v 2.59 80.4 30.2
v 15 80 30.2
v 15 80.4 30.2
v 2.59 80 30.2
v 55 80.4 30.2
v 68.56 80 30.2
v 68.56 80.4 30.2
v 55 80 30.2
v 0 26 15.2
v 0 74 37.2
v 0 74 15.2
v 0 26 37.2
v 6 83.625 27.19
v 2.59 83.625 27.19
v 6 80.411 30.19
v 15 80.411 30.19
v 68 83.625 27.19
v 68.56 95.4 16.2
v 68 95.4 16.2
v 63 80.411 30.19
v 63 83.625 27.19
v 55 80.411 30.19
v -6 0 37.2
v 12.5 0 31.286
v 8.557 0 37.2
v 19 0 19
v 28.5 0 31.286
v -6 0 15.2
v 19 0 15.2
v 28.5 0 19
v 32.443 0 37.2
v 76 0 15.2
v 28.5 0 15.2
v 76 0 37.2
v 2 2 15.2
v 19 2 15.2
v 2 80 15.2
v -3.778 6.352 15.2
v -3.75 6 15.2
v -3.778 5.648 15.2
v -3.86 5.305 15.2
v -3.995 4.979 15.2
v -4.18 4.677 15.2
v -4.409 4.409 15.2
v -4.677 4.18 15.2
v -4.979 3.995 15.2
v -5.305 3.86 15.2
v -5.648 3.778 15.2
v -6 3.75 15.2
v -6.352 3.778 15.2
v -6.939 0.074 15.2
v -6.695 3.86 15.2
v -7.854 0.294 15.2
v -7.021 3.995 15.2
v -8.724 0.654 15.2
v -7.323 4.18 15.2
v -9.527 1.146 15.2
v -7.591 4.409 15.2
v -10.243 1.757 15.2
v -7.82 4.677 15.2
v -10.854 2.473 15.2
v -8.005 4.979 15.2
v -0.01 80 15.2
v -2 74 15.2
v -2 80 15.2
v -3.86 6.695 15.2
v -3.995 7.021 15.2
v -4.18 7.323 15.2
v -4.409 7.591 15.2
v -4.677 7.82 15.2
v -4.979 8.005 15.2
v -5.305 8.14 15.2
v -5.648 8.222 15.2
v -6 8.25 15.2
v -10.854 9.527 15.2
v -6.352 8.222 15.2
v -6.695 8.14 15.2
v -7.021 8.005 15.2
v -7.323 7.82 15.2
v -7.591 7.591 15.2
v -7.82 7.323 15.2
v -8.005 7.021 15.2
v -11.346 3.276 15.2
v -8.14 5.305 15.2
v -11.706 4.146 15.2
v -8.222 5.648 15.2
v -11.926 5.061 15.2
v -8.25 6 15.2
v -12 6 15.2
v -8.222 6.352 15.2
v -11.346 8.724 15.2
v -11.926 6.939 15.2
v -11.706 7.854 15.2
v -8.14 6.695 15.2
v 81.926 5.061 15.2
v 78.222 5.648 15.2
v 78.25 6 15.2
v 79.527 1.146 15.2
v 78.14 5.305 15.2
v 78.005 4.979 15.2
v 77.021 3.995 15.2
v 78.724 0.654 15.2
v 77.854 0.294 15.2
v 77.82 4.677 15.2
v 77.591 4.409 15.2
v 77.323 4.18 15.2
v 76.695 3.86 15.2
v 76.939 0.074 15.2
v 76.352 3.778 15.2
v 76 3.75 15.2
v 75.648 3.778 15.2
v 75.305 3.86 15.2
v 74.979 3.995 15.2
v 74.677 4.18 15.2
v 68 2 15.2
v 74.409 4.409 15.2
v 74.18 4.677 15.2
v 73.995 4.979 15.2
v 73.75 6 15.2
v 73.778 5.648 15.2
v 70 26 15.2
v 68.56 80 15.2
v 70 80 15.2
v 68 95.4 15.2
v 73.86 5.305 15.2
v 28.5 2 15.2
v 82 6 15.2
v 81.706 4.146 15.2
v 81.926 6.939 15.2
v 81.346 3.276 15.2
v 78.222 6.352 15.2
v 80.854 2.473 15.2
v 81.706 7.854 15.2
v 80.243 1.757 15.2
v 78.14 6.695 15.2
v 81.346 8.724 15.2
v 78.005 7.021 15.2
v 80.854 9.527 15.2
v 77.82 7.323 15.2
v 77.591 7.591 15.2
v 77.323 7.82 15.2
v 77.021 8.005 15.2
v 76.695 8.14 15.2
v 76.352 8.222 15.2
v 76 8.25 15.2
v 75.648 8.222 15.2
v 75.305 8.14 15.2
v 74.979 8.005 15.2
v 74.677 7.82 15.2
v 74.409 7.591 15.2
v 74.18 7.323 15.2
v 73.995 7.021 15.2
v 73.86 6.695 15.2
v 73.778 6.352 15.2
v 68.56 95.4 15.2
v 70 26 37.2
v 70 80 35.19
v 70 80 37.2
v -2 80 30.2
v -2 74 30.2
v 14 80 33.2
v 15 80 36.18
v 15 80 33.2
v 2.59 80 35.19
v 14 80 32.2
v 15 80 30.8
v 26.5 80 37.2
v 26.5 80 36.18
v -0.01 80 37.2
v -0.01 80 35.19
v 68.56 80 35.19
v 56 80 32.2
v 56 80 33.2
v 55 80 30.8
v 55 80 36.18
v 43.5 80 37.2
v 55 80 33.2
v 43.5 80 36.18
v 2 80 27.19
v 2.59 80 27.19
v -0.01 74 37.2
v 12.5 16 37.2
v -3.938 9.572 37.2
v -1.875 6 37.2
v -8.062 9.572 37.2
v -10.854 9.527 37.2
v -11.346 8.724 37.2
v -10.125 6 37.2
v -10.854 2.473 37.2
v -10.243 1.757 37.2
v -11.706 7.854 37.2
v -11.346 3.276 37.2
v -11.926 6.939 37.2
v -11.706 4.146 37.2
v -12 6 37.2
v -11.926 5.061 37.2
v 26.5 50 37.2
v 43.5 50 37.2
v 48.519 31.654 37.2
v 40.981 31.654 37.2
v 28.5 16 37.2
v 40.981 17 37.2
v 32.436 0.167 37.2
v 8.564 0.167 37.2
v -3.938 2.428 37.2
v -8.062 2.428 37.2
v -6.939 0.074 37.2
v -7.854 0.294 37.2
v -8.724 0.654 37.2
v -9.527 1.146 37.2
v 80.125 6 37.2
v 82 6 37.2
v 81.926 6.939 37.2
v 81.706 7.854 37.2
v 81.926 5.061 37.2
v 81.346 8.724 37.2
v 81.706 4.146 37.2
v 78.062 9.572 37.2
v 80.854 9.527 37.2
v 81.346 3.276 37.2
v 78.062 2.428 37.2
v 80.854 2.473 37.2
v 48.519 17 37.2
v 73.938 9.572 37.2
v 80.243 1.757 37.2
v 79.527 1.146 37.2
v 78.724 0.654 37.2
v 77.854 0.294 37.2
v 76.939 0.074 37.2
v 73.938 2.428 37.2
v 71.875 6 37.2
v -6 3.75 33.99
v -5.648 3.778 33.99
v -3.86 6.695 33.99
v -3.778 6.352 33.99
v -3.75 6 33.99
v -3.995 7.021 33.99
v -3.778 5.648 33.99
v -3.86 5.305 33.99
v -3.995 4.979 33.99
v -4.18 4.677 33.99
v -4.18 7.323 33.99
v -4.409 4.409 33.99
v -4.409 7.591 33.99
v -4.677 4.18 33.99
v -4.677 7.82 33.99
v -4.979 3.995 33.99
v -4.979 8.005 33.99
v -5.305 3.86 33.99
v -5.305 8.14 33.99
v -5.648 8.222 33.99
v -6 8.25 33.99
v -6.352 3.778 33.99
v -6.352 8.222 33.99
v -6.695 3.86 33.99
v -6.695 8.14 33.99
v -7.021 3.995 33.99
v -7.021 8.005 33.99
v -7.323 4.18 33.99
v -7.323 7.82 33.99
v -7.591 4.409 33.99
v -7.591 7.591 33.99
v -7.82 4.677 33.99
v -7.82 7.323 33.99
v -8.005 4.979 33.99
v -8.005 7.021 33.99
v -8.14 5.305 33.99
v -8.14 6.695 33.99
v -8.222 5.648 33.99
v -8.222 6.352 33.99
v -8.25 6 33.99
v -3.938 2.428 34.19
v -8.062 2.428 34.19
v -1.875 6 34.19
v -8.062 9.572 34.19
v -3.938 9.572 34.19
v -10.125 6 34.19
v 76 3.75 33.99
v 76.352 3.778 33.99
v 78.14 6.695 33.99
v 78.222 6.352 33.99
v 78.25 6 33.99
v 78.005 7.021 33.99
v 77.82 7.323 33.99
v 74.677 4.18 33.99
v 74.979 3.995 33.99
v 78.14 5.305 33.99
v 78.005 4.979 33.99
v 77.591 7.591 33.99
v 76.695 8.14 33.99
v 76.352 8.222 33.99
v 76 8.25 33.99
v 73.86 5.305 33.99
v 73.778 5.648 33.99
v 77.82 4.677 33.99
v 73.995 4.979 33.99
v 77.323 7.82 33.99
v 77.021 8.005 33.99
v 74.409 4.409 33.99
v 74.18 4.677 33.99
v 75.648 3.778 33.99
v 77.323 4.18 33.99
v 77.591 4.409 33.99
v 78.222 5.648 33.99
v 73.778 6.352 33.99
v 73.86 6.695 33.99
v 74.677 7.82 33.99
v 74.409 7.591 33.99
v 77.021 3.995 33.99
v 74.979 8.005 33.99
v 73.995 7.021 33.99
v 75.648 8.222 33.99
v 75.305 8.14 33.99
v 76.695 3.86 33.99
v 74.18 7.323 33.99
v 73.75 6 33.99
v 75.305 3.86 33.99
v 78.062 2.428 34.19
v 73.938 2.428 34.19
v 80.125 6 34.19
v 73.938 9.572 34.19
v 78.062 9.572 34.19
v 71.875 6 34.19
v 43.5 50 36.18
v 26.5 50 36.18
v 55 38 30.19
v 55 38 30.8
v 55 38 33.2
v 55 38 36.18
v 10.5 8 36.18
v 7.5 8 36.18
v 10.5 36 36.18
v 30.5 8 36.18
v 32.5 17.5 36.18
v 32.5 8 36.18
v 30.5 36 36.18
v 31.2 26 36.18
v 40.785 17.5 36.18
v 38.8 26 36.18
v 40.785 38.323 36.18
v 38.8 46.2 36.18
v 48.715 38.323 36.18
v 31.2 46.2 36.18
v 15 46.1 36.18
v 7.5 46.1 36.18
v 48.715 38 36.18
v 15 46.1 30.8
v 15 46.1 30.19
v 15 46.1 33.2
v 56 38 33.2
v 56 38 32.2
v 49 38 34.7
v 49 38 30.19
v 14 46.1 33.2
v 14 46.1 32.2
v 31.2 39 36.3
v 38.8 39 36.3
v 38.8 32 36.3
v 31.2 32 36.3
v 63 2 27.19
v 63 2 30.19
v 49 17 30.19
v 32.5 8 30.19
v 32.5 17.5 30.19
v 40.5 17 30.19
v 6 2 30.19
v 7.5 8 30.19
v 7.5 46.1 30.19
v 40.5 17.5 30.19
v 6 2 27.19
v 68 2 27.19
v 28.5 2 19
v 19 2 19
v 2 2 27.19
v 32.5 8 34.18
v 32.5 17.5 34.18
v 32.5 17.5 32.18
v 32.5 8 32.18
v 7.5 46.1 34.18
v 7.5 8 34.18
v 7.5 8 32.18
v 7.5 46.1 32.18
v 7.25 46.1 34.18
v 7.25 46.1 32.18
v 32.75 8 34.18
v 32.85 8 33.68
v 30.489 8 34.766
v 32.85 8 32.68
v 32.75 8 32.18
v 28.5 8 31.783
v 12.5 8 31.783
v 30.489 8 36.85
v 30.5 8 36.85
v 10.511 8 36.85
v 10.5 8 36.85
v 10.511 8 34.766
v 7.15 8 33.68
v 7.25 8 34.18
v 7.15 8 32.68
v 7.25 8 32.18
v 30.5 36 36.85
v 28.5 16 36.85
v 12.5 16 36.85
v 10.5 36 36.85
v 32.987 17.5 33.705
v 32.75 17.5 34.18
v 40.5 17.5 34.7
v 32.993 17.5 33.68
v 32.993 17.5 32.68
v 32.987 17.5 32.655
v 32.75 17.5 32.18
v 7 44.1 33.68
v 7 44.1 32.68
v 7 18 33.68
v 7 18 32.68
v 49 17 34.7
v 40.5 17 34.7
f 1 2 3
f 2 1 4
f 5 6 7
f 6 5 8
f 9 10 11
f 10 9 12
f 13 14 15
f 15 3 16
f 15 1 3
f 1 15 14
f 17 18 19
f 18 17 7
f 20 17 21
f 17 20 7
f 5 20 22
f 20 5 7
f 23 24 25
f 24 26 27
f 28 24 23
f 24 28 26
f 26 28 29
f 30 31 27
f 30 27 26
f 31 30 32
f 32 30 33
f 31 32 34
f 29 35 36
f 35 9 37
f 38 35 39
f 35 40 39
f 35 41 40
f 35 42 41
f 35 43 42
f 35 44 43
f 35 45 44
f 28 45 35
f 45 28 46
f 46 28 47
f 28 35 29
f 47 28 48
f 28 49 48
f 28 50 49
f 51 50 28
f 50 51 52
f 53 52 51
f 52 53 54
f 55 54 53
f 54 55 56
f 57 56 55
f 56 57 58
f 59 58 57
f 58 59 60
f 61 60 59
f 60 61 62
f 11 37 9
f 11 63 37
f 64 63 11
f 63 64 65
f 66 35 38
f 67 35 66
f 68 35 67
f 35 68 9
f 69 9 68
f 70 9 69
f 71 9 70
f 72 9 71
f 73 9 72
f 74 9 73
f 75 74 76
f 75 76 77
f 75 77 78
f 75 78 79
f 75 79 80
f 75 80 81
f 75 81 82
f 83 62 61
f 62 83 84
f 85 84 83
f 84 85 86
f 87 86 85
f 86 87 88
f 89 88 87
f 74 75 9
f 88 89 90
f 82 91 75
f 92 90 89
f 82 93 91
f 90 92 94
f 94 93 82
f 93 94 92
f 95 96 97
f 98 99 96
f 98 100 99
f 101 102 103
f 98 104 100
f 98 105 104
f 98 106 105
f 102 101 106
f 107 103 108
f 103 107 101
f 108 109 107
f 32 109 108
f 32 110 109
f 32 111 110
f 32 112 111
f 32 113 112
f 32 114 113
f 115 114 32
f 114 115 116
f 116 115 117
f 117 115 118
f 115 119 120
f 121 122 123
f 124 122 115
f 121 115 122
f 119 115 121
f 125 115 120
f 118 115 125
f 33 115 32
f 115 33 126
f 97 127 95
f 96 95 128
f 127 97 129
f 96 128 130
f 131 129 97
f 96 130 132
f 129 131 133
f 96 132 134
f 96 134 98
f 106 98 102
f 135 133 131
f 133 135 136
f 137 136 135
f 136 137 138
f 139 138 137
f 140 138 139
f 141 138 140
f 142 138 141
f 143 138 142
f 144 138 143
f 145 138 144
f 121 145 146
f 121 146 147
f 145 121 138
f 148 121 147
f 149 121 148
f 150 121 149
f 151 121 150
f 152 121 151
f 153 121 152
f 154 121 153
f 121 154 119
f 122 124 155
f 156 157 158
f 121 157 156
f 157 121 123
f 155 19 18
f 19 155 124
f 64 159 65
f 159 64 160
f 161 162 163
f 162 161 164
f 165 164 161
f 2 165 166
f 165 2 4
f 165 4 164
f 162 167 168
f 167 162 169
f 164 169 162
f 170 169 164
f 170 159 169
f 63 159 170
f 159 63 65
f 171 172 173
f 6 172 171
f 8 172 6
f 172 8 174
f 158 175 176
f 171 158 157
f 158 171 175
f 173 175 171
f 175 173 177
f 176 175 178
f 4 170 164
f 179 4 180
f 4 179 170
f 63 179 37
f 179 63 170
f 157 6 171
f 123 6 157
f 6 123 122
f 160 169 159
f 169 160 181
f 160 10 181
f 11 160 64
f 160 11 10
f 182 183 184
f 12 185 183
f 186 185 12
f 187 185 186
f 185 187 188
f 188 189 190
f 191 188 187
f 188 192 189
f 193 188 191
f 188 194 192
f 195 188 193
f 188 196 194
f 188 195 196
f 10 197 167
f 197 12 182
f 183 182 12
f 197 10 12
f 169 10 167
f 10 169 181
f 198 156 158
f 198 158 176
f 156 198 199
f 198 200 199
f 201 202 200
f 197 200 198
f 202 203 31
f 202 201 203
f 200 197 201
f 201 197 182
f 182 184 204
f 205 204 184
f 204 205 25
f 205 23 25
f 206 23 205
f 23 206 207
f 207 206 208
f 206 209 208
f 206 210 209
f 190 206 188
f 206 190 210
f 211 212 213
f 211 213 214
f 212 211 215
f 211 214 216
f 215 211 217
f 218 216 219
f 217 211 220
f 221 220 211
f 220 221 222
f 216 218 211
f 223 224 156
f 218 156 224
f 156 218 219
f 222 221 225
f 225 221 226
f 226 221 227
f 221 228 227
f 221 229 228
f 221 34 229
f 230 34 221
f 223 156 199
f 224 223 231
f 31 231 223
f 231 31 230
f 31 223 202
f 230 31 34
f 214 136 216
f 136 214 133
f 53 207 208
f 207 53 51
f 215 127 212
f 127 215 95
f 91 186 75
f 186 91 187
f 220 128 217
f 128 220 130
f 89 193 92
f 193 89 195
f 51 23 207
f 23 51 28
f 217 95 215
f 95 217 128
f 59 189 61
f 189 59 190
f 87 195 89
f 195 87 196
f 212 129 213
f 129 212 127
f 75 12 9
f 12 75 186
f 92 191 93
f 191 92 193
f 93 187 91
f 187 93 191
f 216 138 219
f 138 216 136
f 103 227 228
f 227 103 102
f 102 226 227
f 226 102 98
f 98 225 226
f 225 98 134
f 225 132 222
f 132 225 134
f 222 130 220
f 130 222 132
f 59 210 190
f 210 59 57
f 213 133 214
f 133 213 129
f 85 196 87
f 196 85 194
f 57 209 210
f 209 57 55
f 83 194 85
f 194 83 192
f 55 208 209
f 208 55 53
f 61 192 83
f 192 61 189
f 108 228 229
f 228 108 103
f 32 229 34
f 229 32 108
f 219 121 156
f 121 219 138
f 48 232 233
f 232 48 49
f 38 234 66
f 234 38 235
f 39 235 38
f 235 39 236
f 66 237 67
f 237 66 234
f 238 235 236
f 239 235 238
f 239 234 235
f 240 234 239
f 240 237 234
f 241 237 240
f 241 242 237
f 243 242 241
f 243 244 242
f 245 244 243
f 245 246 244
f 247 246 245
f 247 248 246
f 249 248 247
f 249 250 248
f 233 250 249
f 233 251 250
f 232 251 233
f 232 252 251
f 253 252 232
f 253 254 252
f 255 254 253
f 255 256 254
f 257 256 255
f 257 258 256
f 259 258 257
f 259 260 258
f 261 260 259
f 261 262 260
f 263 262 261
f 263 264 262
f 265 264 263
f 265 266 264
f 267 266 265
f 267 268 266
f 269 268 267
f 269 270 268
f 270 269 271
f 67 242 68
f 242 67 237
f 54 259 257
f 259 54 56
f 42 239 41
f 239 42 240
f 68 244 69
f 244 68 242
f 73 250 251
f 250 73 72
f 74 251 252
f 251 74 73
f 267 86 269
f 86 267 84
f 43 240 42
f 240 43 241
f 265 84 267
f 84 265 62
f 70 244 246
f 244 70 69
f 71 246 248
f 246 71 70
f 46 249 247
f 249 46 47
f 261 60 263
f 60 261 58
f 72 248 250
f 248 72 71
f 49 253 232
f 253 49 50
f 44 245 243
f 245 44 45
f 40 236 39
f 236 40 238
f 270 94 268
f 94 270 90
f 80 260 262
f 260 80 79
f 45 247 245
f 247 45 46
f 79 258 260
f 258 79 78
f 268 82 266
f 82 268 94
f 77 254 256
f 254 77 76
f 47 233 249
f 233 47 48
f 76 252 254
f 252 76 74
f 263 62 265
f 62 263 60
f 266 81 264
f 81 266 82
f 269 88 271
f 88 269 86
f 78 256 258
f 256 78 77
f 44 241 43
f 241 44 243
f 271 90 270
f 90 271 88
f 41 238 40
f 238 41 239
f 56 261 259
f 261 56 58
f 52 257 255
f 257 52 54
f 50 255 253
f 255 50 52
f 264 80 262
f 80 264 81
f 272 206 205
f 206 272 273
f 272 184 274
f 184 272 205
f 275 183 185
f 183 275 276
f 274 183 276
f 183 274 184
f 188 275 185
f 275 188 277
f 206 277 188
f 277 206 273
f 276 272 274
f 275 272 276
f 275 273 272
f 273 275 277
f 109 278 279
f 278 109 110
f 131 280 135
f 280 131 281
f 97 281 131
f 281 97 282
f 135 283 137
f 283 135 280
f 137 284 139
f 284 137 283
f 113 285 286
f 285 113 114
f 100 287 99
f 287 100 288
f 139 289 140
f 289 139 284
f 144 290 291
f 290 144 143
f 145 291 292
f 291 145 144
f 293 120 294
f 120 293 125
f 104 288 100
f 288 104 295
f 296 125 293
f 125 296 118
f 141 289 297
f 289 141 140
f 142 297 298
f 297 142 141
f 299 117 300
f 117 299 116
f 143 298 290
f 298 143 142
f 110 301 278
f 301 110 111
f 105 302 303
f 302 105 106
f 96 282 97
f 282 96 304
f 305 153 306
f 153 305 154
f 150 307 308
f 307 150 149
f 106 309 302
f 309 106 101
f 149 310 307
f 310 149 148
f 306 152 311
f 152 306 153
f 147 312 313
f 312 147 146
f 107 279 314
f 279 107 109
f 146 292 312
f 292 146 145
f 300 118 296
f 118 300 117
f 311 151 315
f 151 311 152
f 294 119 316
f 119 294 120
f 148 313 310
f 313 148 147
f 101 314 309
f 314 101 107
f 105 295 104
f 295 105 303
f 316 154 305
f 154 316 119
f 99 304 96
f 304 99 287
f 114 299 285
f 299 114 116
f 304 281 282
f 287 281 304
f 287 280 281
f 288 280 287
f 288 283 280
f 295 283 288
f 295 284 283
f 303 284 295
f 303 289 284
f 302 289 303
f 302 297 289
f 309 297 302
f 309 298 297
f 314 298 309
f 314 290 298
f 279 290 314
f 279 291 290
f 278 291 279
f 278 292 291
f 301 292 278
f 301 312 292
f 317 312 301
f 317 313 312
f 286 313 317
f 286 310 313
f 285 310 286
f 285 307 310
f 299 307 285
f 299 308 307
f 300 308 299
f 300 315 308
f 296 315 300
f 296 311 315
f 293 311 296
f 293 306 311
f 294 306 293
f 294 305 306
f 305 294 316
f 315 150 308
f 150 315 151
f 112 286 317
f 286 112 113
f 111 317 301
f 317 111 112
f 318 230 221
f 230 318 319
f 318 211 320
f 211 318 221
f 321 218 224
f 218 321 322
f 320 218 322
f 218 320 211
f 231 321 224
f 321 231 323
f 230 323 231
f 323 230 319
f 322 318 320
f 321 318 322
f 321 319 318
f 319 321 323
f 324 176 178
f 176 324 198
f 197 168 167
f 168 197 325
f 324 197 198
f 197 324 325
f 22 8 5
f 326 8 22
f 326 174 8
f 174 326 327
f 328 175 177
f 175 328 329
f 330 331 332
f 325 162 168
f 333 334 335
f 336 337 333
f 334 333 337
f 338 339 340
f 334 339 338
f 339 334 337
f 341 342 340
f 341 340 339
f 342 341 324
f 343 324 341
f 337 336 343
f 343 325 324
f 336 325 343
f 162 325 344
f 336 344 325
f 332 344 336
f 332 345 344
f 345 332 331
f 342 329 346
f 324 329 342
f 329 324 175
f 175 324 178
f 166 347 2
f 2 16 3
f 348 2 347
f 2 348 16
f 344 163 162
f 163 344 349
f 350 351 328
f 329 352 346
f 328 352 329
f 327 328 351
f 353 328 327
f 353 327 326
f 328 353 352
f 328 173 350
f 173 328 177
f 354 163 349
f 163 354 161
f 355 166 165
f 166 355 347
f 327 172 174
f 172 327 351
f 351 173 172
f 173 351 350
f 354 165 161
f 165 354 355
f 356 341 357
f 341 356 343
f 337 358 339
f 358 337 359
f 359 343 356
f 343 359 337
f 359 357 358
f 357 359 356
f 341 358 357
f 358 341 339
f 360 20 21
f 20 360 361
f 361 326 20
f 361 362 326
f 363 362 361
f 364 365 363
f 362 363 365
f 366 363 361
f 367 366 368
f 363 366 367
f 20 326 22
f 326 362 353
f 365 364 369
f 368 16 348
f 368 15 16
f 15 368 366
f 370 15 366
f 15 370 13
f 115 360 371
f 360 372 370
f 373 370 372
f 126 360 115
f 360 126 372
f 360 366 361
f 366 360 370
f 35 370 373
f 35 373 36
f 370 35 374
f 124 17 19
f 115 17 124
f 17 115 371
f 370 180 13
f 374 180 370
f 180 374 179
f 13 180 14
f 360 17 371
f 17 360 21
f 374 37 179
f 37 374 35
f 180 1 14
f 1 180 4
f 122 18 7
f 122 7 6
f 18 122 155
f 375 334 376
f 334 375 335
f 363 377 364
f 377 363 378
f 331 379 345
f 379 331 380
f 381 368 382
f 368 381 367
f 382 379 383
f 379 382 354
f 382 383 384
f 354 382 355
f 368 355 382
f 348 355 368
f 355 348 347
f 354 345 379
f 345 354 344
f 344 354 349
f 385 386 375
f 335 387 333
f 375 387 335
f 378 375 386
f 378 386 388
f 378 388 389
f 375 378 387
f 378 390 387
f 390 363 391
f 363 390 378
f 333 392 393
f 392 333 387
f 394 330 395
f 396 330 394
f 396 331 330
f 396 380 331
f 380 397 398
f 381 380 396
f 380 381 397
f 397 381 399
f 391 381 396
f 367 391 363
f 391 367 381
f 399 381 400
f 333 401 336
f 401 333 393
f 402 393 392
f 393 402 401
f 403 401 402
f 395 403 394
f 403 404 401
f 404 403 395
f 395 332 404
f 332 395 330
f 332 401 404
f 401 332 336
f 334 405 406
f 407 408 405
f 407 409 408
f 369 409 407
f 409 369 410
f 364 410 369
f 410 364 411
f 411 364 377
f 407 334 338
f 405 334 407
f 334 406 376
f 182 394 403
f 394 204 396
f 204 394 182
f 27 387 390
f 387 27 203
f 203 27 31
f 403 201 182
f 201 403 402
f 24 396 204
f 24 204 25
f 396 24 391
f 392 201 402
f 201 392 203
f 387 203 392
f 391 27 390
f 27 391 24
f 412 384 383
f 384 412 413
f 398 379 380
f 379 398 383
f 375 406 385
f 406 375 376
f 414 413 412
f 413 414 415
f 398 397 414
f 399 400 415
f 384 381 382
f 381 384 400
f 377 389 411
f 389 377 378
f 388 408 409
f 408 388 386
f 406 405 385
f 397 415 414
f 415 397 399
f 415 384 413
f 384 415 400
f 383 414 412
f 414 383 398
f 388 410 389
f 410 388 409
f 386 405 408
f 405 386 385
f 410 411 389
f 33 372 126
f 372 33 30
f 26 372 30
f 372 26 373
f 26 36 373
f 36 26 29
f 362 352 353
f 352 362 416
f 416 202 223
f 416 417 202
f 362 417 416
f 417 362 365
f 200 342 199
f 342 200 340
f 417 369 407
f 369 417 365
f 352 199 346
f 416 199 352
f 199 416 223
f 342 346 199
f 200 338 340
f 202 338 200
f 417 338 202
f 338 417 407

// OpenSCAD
$fn=40;
main_h = 28-0.1+2;
base_length = 96;
top_h = 22;

//base();
intersection() {
  //translate([0,0,10]) cube([52,50,30]);
  top();
}
module top() {
  translate([0,0,15.2]) difference() {
    //cube([70,base_length,main_h-15]);
      // above PCB
    union() {
      translate([0,0,0]) hull() {
        cube([70, base_length-0.6, 1]);
        cube([70, base_length-0.6-15, 15]);
      }
      translate([-2, base_length-22,0]) hull() {
        cube([2,6,15]);
        translate([2-0.01,0,0]) #cube([0.01,6,22]);
      }
      translate([0,0,0])
        cube([70, base_length-16, top_h]);
      
      // bolt flange
      translate([0,6,0]) hull() {
        cube([70,20,top_h]);
        translate([-6,0,0]) cylinder(d=12,h=top_h);
        translate([70+6,0,0]) cylinder(d=12,h=top_h);
      }
      
    }

    // bolt thingies
    translate([0,6,0]) {
      translate([-6,0,-0.01]) {
        cylinder(d=4.5,h=top_h-3.2);
        translate([0,0,top_h-3]) cylinder(d=8.25,h=3.2, $fn=6);
      }
      translate([70+6,0,-0.01]) {
        cylinder(d=4.5,h=top_h-3.2);
        translate([0,0,top_h-3]) cylinder(d=8.25,h=3.2, $fn=6);
      }
    }

    translate([(70-56)/2-1,2,-0.01])
      cube([56+1,base_length,15]);
    translate([(70-66)/2,2,-0.01]) 
      cube([66,base_length,12]);
    
    // extra thicc for side USB
    translate([-0.01,base_length-16,-0.01])
      #cube([1.6+1,16,20]);
    
    // non-usb side
    translate([70-1.44,base_length-16,-0.01])
      cube([1.6,16,20]);
    
    // above PCB
    /* translate([2.8/2,base_length-20,-0.01]) hull() {
      cube([66-0.4*2+2, 20, 1]);
      cube([66-0.4*2+2, 20-15, 16]);
    } */
  //55
    
    // GPS
    translate([70/2,38,0]) union() {
      translate([-17/2,12,15-0.02])
        cube([17,42,14.2]);
      
      translate([-40/2,0,15-0.02])
        cube([40,42+16+3,6]);
      translate([-42/2,0,15+2]) hull() {
        cube([42,43,1]);
        translate([1,0,-1.4]) cube([40,43,1.4]);
      }
      translate([-41.5/2,33,15+2]) hull() {
        cube([41.5,43,1]);
        translate([1,0,-1.4]) cube([40-0.5,43,1.4]);
      }
      
      // qwiic
      translate([-7.6/2,-16,14-0.1]) hull() {
        translate([0,10,0]) cube([7.6,7,7.2]);
        cube([7.6,17+12,7]);
      }
    }
    
    // logger
    // basic opening
    translate([70/2-31+3.5,8,15-0.02])
      cube([25,26+4.1+8,6]);
    // thinner section for sd card holder
    translate([70/2-31+3.5+3,8,19.65])
      cube([20,28,2]);
    
    // qwiic notch
    translate([70/2-31+24,6+11.5,12-0.02]) cube([5+8,16+5,9]);

    // sd card thumb opening
    translate([70/2-31+3.5+5,-0.1,17.1-0.02]) hull() {
      translate([-4,0,5]) cube([24,0.01,1]);
      translate([0,0,-1]) cube([16,0.01,1]);
      cube([16,4.1+8+4,5]);
    }
    
    translate([70/2-31+3,8,14-0.02]) hull() {
      //translate([-17/2,0,15-0.02])
       translate([0.25,0,3]) cube([25.5,26+4.1+8,2]);
      translate([0.15,0,3.5]) cube([25.7,4.1,1]);
        translate([0,10,3.5]) cube([26,26+4.1-4,1]);
      //translate([0.5,0,2.5]) cube([26.5,26+4.1,4]);
    }
    
    // USB
    translate([19, -0.1, -1.2])
      cube([9.5,2.2,5]);
    
    // reset button
    translate([41,17,0]) hull() {
      cube([7.5,14,22.1]);
      translate([-0.5,0,0]) cube([8.5,31,19.5]);
    }
  }
}

module base() {
  // +20 for LCD above antenna
  difference() {
    union() {
      cube([70,base_length,main_h]);
      translate([0,base_length-10.2,main_h-0.1]) hull() {
        translate([15,0,0]) cube([30+10,10.2,0.01]);
       translate([18,0,0]) cube([34,10.2,4]);
      }
      
      // bolt flange
      translate([0,6,0]) hull() {
        cube([70,20,main_h]);
        translate([-6,0,0]) cylinder(d=12,h=main_h);
        translate([70+6,0,0]) cylinder(d=12,h=main_h);
      }
      translate([0,base_length-2,0]) hull() {
        translate([-2,-20,0]) cube([70+2,20+2,main_h]);
        /* translate([-6,0,0]) #cylinder(d=12,h=main_h);
        translate([70+6,0,0]) cylinder(d=12,h=main_h); */
      }
    }
    
    // bolt thingies
    translate([0,6,0]) {
      translate([-6,0,-0.1]) {
        #cylinder(d=4.5,h=main_h+0.2);
        translate([0,0,main_h-3]) cylinder(d=8.25,h=3.2, $fn=6);
      }
      translate([70+6,0,0]) {
        #cylinder(d=4.5,h=main_h+0.2);
        translate([0,0,main_h-3]) cylinder(d=8.25,h=3.2, $fn=6);
      }
    }
    translate([0,base_length-6,0]) {
      translate([-6,0,-0.1]) {
        #cylinder(d=4.5,h=main_h+0.2);
        translate([0,0,main_h-3]) #cylinder(d=8.25,h=3.2, $fn=6);
      }
      translate([70+6,0,0]) {
        #cylinder(d=4.5,h=main_h+0.2);
        translate([0,0,main_h-3]) #cylinder(d=8.25,h=3.2, $fn=6);
      }
    }
    
    // base (under the pcb)
    translate([3,2,2])
      cube([64,base_length-4.8,13]);
    // 'duino plate
    //translate([0,0,13+16])
    translate([8,20,13+13])
      cube([54,58,2]);
    
    // top (bottom?) USB
    translate([19, -0.1, 14])
        #cube([9.5,2.2,6]);
    // side USB
    translate([-1,base_length-3-12+4-10,14]) hull() {
      cube([5.2,17,8]);
      //translate([5.1-1,-6,0]) #cube([0.1,17,8]);
    }
    
    // PCB jut-out near antenna
    translate([20.5,base_length-2,13])
      #cube([40,2.2,4]);
    // antenna
    translate([37,base_length-4-20,11])
      #cube([12,4.2+20,10]);
    
    translate([2,2,2]) {
      // pcb and pins above it
      translate([0,0,11]) hull() {
        cube([66,base_length-2.8,0.2]);
        translate([0.4,0,0.01])
          cube([66-0.4*2,base_length-2.8,2.4]);
      }
      // above PCB
      translate([0.4-1,0,13-0.01]) hull() {
        cube([66-0.4*2+2, base_length-2.8, 1]);
        cube([66-0.4*2+2, base_length-2.8-15, 16]);
      }

    }
    
    // LCD slot/cutout
    translate([20,base_length-10.2-0.1,main_h-0.01]) cube([30,10.4,4.2]);

    
    // wipe off the top
    translate([-15,-0.8,15]) cube([130,base_length-3-12-0,15]);
    //4,4
    //translate([7,-0.8,15]) #cube([130,base_length-3-12,15]);
    translate([7,base_length-16.2,15])
      cube([70-7*2,6,16]);
    //cube([70,base_length,main_h]);
    
  /*  // tmp wipe the far side so we can print faster
    translate([60,-2,-1]) cube([100,120,30]);
    // tmp wipe inner corner
      translate([-12,6,-1]) cube([40,60,30]);

    translate([-12,-1,-1]) cube([11,10,30]);
    // 40,9 */
  }
}
